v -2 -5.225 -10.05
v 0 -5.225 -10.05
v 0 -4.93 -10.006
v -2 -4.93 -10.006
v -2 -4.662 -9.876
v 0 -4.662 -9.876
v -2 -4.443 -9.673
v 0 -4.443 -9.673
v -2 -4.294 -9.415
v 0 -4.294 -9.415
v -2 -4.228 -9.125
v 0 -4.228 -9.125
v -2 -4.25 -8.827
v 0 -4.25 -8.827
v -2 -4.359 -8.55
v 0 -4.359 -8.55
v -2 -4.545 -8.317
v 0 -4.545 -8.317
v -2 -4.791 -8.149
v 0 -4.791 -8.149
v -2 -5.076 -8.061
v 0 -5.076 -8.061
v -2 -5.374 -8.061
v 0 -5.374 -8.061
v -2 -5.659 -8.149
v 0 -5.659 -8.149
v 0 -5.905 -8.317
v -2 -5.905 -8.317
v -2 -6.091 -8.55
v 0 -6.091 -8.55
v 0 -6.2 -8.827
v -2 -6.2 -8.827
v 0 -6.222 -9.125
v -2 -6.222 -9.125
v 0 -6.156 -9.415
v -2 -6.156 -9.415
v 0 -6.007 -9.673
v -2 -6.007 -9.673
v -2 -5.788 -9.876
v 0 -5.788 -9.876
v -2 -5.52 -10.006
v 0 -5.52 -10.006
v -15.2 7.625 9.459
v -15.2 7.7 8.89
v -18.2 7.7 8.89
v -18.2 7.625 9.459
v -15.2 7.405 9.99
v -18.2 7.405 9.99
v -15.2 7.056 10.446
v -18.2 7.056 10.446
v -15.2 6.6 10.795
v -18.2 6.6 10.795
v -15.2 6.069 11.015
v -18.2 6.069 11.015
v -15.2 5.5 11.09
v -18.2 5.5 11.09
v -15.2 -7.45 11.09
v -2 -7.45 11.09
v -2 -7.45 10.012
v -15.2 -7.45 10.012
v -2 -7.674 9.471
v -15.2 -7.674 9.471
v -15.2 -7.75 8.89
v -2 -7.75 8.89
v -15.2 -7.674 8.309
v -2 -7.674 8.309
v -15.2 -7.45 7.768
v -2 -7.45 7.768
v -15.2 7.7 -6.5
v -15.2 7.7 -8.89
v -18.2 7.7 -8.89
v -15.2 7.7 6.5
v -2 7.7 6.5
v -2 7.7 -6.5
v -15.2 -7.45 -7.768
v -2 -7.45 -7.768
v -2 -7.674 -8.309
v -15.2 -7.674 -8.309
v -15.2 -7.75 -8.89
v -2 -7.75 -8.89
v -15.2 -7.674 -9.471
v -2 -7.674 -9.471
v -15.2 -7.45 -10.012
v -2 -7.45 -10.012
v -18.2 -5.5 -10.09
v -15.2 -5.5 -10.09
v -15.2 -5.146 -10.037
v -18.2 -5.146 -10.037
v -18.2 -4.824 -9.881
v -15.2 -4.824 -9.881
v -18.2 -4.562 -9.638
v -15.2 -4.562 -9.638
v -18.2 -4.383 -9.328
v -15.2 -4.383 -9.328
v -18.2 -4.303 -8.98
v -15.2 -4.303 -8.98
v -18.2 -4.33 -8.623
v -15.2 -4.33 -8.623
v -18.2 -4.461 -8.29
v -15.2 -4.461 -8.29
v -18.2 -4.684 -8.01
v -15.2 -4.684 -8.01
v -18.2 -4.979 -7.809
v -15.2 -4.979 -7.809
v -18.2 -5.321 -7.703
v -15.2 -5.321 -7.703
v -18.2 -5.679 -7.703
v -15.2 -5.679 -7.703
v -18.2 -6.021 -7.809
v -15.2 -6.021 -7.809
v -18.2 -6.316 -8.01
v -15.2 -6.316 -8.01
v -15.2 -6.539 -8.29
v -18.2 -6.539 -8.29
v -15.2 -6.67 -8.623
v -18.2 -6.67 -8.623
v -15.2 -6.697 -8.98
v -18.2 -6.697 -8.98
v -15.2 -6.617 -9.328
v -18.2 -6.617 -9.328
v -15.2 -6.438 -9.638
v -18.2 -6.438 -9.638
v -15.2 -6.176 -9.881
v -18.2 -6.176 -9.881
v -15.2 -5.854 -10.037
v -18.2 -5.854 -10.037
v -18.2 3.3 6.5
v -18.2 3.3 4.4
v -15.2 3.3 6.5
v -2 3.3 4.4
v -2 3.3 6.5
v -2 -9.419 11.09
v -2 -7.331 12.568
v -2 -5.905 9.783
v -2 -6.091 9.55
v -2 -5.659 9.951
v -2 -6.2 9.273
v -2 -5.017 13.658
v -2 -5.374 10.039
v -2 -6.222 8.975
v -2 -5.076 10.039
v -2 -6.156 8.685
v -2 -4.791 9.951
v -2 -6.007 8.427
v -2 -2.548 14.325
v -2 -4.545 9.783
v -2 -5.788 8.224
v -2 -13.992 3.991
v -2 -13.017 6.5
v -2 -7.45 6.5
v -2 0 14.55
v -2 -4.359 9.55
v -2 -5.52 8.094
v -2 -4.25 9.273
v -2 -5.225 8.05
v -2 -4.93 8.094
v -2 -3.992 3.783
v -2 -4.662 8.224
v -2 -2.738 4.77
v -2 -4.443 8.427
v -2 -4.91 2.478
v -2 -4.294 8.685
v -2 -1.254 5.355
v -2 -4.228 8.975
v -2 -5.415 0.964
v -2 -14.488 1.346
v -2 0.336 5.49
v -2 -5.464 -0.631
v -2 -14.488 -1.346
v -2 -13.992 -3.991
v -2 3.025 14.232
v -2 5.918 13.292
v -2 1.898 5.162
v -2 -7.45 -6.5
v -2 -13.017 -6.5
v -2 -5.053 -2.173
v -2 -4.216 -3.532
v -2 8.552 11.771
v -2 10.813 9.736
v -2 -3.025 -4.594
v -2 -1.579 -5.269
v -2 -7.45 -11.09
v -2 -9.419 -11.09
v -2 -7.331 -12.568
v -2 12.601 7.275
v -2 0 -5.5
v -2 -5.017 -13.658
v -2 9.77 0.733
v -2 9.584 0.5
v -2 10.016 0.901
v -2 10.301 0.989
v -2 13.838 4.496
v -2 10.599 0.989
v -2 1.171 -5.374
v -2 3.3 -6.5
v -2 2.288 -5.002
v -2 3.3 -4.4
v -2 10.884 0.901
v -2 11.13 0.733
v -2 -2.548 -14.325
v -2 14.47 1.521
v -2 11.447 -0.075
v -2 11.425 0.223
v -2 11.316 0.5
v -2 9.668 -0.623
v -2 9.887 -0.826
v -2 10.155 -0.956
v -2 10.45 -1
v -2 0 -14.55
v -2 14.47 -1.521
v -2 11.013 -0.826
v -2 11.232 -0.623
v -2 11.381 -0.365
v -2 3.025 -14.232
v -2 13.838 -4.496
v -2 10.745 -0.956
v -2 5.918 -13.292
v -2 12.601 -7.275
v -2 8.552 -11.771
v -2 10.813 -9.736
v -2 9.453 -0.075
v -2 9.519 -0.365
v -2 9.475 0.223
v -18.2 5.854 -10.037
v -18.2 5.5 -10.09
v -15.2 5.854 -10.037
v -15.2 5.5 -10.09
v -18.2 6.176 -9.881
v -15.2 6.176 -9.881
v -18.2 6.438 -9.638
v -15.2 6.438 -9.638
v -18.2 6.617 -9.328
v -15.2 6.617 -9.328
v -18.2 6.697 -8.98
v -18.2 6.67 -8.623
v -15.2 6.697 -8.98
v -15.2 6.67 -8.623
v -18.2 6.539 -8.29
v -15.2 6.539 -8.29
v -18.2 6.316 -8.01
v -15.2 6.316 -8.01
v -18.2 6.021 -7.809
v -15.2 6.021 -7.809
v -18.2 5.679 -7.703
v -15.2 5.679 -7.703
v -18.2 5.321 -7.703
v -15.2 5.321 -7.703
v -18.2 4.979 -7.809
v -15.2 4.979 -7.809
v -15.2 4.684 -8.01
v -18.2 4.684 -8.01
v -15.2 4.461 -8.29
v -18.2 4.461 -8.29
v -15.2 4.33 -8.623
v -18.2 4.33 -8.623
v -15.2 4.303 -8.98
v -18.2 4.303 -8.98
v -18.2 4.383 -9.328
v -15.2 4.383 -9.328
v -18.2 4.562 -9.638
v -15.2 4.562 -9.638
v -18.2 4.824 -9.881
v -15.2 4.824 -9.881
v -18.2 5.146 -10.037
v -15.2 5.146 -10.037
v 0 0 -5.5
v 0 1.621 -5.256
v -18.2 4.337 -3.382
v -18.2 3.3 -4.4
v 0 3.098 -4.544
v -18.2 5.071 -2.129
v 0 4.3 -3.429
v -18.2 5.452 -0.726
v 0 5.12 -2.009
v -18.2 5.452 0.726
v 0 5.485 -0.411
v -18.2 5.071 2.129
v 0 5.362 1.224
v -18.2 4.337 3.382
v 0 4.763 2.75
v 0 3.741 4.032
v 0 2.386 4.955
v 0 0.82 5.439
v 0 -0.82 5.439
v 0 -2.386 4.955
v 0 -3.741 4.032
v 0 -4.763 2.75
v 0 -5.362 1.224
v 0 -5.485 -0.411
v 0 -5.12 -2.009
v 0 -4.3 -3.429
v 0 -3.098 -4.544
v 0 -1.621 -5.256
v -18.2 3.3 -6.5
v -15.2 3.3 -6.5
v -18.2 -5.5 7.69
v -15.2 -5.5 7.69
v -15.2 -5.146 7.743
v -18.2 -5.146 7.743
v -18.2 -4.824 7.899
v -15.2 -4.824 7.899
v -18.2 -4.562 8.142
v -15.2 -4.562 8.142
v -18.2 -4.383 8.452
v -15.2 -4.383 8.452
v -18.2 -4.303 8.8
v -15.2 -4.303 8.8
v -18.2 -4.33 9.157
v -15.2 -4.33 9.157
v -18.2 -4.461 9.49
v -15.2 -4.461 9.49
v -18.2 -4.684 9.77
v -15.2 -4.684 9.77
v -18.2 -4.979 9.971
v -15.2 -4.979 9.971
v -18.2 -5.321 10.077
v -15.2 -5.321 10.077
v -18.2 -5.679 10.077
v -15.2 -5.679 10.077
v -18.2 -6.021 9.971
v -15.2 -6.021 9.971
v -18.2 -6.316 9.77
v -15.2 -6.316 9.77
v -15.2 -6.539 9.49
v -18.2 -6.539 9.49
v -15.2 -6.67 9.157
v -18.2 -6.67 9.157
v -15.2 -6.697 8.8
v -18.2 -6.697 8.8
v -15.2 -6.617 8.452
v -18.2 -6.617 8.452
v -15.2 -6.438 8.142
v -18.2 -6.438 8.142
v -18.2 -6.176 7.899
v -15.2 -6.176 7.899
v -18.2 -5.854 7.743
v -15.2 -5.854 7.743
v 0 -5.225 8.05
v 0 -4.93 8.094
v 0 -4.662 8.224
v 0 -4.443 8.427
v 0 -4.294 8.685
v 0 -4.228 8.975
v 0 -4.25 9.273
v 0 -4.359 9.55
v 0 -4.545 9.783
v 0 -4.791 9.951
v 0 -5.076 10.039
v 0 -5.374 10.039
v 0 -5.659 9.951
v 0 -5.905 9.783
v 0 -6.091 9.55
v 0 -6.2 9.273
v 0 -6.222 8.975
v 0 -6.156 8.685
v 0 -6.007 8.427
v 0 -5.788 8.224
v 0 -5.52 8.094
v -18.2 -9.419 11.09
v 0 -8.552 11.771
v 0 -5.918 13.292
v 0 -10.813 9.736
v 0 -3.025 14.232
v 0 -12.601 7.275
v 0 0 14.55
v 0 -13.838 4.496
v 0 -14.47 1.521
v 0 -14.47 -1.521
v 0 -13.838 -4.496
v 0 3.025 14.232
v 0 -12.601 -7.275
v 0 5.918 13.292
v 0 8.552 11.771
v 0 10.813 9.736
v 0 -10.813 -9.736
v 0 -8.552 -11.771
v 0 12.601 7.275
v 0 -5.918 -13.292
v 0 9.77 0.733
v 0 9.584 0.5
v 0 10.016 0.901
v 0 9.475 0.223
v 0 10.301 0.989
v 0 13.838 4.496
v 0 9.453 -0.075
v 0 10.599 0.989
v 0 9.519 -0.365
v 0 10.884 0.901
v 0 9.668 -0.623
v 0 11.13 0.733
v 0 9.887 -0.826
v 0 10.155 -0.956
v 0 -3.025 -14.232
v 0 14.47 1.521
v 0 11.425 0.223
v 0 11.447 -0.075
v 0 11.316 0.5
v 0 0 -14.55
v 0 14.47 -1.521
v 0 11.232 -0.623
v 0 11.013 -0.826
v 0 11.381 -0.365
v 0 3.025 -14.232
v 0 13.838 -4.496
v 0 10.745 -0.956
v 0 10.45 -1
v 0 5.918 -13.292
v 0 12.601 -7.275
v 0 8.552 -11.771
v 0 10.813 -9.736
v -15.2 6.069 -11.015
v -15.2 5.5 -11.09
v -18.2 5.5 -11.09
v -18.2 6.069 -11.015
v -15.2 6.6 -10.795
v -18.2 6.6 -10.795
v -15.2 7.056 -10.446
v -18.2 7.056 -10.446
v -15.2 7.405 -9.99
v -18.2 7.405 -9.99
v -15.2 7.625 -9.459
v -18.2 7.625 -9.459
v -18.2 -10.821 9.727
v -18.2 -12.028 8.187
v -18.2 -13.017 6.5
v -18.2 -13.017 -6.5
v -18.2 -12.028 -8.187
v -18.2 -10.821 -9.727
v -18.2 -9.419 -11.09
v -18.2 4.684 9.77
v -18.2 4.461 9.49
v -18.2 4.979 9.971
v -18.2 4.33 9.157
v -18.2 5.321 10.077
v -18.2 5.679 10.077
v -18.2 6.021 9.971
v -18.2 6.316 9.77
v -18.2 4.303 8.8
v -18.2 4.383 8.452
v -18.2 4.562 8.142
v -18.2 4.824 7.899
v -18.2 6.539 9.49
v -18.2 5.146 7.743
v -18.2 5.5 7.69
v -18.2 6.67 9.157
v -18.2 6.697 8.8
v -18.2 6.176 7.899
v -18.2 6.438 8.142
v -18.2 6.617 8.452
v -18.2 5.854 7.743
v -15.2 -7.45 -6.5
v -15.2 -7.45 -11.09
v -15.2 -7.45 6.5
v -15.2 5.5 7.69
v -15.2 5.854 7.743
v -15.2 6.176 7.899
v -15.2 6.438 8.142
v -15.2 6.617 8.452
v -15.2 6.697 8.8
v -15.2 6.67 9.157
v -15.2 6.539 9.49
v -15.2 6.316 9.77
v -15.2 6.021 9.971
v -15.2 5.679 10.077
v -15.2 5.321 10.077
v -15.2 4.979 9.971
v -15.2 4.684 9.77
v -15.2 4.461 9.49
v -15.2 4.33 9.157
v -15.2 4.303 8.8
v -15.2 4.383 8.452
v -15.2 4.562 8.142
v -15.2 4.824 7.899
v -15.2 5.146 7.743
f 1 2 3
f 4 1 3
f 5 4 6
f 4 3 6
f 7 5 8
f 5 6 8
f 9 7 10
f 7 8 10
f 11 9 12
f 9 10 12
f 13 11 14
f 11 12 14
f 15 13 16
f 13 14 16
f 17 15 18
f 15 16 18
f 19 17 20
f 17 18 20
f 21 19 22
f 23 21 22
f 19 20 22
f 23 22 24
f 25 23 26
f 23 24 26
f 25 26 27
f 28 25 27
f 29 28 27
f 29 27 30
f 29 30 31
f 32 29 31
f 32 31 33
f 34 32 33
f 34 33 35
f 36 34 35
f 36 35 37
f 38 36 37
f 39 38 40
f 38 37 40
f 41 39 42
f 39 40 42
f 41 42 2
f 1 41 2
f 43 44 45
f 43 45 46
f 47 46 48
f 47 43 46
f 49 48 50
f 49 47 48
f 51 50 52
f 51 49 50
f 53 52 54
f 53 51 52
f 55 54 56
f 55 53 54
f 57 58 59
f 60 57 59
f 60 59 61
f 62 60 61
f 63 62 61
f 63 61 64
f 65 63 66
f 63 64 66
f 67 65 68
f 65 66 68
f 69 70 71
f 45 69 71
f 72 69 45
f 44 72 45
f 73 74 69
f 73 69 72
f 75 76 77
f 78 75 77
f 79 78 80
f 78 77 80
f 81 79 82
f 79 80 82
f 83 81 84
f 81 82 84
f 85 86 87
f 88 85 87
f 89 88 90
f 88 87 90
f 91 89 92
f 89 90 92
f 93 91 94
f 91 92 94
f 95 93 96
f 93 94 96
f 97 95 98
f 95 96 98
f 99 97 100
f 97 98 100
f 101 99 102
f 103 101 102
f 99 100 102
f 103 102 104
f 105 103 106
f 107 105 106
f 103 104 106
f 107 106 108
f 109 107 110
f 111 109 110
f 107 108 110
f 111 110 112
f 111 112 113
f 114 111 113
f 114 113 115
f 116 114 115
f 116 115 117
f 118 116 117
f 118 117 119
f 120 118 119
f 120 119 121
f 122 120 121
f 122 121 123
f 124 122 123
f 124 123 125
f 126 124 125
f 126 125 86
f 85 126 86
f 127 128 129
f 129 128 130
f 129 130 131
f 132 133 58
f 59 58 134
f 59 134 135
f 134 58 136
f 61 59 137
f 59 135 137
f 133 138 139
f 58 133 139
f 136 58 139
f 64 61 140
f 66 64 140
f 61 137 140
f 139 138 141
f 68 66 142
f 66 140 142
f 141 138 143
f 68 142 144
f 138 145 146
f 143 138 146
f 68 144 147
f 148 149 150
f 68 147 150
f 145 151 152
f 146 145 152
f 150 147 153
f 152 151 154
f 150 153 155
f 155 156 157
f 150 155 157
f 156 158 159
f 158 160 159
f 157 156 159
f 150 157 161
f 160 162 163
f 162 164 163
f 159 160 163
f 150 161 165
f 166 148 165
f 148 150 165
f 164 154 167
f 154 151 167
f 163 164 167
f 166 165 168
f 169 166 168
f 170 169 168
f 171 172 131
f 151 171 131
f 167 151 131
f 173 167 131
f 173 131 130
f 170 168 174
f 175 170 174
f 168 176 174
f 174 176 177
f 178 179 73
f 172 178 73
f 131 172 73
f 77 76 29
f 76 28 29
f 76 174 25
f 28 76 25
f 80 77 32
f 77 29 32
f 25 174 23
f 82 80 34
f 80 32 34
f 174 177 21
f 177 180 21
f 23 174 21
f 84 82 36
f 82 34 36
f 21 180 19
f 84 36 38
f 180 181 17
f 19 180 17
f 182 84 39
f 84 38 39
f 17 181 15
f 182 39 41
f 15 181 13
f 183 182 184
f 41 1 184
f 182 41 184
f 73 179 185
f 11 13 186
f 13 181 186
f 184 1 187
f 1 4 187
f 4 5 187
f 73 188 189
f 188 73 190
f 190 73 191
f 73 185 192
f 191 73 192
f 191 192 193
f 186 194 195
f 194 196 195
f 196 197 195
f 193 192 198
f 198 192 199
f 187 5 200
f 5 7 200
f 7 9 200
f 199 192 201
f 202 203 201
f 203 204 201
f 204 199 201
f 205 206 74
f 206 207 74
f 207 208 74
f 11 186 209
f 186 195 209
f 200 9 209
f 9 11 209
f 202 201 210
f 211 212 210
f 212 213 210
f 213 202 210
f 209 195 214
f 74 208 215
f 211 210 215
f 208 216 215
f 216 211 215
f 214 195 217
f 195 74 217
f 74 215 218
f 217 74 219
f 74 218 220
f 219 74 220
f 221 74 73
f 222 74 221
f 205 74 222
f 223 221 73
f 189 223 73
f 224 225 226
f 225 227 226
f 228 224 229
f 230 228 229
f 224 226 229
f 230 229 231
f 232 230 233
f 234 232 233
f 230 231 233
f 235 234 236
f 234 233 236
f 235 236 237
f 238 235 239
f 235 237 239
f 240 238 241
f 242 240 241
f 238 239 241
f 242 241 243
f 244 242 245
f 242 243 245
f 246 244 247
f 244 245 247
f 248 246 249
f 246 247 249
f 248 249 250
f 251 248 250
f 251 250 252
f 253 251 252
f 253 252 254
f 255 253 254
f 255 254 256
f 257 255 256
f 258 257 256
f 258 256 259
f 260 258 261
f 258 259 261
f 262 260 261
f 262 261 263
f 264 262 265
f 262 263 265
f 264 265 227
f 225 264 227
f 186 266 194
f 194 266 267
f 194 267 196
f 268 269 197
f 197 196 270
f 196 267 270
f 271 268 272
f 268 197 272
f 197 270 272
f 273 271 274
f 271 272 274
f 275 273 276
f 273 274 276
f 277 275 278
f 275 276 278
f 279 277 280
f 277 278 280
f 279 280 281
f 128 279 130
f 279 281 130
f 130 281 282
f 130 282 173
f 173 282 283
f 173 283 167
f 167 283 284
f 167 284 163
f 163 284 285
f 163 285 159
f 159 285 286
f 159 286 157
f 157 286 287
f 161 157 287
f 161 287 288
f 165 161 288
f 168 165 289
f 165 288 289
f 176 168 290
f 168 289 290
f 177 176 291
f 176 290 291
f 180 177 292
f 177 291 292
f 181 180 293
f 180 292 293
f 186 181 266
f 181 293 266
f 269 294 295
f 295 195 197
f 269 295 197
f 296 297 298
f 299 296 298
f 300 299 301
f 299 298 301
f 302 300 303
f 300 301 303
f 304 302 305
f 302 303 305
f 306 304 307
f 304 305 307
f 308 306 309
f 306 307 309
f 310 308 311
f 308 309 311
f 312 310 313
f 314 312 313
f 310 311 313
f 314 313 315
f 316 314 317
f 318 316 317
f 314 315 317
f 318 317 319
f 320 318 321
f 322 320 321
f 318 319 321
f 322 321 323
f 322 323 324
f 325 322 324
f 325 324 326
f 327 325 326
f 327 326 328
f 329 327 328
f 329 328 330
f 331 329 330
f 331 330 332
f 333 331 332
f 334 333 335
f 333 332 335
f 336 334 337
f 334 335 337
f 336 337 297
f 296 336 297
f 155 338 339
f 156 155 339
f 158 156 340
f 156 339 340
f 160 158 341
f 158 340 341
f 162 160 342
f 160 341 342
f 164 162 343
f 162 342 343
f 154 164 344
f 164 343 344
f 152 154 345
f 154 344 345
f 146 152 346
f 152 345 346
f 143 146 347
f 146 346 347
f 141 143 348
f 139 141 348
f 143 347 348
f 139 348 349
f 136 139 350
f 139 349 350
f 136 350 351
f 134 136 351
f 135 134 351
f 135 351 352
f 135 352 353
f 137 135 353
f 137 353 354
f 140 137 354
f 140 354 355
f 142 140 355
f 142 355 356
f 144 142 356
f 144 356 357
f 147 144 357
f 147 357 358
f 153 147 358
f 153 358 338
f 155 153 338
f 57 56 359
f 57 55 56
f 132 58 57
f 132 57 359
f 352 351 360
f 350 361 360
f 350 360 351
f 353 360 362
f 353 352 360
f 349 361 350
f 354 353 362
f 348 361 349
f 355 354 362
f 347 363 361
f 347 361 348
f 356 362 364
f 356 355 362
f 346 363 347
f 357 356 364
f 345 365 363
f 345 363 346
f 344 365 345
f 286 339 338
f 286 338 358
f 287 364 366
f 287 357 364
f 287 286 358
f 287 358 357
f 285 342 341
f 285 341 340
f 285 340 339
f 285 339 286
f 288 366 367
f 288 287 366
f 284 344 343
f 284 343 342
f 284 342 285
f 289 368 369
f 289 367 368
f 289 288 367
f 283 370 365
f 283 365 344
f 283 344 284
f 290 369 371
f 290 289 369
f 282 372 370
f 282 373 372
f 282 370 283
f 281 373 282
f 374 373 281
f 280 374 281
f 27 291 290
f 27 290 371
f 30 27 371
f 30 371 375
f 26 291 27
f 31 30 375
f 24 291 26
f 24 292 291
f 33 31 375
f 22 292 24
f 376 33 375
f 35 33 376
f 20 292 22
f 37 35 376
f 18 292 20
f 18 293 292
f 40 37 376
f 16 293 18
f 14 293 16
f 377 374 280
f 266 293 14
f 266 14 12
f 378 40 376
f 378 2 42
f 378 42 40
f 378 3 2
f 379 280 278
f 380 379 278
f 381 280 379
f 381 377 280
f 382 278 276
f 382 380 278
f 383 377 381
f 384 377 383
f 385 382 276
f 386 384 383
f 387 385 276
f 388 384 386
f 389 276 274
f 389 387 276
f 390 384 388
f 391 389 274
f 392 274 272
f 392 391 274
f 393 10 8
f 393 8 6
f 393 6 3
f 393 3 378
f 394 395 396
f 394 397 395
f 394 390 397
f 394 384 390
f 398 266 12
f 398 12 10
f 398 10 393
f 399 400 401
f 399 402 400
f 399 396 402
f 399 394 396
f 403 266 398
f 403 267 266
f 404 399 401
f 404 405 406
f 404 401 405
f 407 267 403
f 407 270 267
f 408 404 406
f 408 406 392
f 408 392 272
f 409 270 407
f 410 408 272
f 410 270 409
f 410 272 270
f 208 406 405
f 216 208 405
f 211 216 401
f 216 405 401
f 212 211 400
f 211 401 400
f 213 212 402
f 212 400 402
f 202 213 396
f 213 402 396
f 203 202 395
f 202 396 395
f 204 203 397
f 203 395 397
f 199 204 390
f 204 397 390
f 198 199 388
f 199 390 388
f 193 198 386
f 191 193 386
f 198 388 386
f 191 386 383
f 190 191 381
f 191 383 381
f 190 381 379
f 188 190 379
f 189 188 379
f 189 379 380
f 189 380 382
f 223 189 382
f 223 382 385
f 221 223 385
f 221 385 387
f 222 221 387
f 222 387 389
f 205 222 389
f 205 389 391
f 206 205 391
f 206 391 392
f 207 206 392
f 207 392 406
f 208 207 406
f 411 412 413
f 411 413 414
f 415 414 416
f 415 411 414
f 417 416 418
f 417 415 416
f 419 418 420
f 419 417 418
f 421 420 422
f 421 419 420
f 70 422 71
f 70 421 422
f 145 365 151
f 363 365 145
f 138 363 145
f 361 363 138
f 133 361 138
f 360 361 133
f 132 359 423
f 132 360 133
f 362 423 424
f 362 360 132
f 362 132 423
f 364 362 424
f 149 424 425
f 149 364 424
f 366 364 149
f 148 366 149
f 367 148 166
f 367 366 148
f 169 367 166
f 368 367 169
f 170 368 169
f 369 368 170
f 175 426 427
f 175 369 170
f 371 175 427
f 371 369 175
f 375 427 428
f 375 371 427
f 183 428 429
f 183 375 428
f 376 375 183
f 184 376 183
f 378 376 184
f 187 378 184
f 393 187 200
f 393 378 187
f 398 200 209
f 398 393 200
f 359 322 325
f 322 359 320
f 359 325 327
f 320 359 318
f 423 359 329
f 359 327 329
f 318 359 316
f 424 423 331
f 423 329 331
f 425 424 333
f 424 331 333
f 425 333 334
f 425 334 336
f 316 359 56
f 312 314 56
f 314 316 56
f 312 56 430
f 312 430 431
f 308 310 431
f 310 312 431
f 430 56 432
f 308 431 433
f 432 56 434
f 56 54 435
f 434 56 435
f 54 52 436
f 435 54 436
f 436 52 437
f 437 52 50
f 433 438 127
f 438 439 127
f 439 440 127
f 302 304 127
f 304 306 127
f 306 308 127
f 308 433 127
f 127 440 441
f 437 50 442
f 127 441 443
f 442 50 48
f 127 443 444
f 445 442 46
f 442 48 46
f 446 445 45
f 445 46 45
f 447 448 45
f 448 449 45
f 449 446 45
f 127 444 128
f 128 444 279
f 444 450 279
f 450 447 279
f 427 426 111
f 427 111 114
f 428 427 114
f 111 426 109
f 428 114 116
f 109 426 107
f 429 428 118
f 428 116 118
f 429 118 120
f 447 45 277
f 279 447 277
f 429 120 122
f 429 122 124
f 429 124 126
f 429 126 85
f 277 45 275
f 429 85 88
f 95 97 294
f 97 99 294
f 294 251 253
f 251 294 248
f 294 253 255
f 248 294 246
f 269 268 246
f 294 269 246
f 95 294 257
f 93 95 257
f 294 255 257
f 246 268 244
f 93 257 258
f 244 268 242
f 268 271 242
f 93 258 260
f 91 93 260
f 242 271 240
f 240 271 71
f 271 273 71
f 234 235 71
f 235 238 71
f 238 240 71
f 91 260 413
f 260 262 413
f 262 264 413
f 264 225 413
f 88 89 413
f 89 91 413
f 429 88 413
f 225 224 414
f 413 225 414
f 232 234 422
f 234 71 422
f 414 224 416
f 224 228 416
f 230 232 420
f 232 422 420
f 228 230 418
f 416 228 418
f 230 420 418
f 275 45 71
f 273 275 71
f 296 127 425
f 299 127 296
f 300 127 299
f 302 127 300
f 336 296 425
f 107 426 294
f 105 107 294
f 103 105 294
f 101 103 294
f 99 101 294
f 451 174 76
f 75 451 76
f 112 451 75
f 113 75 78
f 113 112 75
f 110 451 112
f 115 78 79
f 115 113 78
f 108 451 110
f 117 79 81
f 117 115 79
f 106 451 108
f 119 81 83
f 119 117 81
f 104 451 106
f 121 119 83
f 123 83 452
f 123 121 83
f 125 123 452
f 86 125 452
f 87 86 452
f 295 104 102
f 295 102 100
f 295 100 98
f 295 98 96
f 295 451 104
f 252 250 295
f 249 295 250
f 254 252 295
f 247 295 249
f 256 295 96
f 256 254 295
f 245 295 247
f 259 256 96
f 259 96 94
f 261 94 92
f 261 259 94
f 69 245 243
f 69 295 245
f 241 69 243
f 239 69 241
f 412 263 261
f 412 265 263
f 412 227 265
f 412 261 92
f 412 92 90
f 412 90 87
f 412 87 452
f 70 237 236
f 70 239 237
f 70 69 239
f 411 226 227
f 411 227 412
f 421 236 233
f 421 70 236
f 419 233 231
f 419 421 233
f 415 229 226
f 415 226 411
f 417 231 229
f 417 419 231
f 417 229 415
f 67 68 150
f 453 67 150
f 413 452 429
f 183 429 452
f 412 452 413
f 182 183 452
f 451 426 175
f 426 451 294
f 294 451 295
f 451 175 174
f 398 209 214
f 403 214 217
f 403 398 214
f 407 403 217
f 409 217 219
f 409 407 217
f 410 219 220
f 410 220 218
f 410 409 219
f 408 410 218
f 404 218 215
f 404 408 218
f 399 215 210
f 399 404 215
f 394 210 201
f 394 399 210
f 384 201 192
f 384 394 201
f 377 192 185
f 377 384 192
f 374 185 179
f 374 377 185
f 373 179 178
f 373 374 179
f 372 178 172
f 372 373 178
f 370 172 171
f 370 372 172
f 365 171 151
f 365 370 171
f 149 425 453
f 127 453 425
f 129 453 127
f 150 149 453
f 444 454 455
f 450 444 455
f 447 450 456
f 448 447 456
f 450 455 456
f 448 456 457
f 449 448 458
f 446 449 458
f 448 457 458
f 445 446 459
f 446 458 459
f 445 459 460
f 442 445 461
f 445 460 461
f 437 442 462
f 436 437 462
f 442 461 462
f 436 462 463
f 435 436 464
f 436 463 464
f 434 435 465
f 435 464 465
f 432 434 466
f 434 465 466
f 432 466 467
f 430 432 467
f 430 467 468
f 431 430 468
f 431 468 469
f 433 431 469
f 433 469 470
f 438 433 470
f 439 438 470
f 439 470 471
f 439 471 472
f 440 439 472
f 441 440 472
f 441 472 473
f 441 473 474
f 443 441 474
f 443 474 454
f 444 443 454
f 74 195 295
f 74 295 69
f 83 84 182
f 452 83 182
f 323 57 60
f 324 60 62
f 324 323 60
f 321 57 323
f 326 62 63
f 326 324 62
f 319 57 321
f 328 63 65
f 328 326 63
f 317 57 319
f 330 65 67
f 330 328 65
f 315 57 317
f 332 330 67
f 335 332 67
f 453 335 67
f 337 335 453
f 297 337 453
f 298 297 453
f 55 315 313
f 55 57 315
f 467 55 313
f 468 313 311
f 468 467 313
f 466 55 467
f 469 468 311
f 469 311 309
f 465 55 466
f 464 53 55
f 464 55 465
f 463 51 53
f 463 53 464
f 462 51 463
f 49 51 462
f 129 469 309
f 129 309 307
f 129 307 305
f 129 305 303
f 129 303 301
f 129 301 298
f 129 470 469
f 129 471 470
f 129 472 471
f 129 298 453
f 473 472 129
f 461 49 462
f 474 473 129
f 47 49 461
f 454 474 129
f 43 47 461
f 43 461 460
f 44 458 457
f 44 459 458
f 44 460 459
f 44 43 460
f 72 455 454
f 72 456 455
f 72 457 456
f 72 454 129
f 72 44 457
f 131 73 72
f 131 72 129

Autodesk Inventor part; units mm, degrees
ref_plane "YZ Plane" through (0, 0, 0) normal (1, 0, 0) x (0, 1, 0)
ref_plane "XZ Plane" through (0, 0, 0) normal (0, 1, 0) x (-1, 0, 0)
ref_plane "Arbeitsebene1" through (0, 0, 0) normal (1, 0, 0) x (0, 0, -1)
sketch "Skizze1" plane through (0, 0, 0) normal (1, 0, 0) x (0, 0, -1)
  arc A0 (14.55, 0) -> (-14.55, 0) centre (0, 0) ccw
  circle A1 centre (0, 0) radius 5.5
  line L0 (-20.8128, 0) -> (22.3238, 0) construction
  line L1 (0, -22.3037) -> (0, 20.6923) construction
  circle A2 centre (0, 10.45) radius 1
  circle A3 centre (-9.05, -5.225) radius 1
  circle A4 centre (9.05, -5.225) radius 1
  circle A5 centre (0, 0) radius 10.45 construction
  line L2 (0, 0) -> (9.05, -5.225) construction
  line L3 (0, 0) -> (-9.05, -5.225) construction
  line L4 (8.89, -5.5) -> (-8.89, -5.5) construction
  line L5 (-8.89, -5.5) -> (-8.89, 5.5) construction
  line L6 (-8.89, 5.5) -> (8.89, 5.5) construction
  line L7 (8.89, 5.5) -> (8.89, -5.5) construction
  circle A6 centre (8.89, 5.5) radius 1.2
  circle A7 centre (-8.89, 5.5) radius 1.2
  arc A8 (-14.55, 0) -> (14.1469, 3.4013) centre (0, 0) ccw
  line L8 (8.89, 7.7) -> (-8.89, 7.7)
  line L9 (6.5, 3.3) -> (6.5, 7.7)
  line L10 (-4.3414, 8.5633) -> (-4.3414, 8.4781)
  line L11 (-6.5, 7.7) -> (-6.5, 3.3)
  arc A9 (4.4, 3.3) -> (-4.4, 3.3) centre (0, 0) ccw
  line L12 (6.5, 3.3) -> (4.4, 3.3)
  line L13 (-4.4, 3.3) -> (-6.5, 3.3)
  line L14 (-6.5, -13.0174) -> (-6.5, -7.45)
  line L15 (6.5, -13.0174) -> (6.5, -7.45)
  line L16 (11.09, -9.4188) -> (11.09, -7.45)
  circle A10 centre (8.89, -5.5) radius 1.2
  circle A11 centre (-8.89, -5.5) radius 1.2
  line L17 (11.09, -7.45) -> (11.09, 5.5)
  line L18 (-6.5, -7.45) -> (-6.5, 3.3)
  line L19 (-11.09, -7.45) -> (-11.09, 5.5)
  arc A12 (-8.89, 7.7) -> (-11.09, 5.5) centre (-8.89, 5.5) ccw
  arc A13 (11.09, 5.5) -> (8.89, 7.7) centre (8.89, 5.5) ccw
  arc A14 (7.7675, -7.45) -> (10.0125, -7.45) centre (8.89, -5.5) ccw
  line L20 (6.5, -7.45) -> (7.7675, -7.45)
  line L21 (10.0125, -7.45) -> (11.09, -7.45)
  arc A15 (-10.0125, -7.45) -> (-7.7675, -7.45) centre (-8.89, -5.5) ccw
  line L22 (-11.09, -7.45) -> (-10.0125, -7.45)
  line L23 (-7.7675, -7.45) -> (-6.5, -7.45)
  line L24 (6.5, -7.45) -> (6.5, 3.3)
  line L25 (-11.09, -7.45) -> (-11.09, -9.4188)
  point P0 (0, 14.55)
  dimension "d2" = 11
  dimension "d9" = 2
  dimension "d11" = 120
  dimension "d12" = 20.9
  dimension "d19" = 11
  dimension "d20" = 17.78
  dimension "d22" = 2.4
  dimension "d29" = 14.55
  dimension "d30" = 5.5
  dimension "d38" = 2.2
  dimension "d39" = 13
  dimension "d42" = 4.5
  dimension "d43" = 0.3
extrude "Extrusion1" add sketch "Skizze1" against normal blind 2 contours A8 L16 L17 A13 L8 A12 L19 L25 A0 | A8 L15 L20 A14 L21 L16 | A8 L14 L18 L13 A1 L12 L24 L15 | L21 A14 L20 L24 L9 L8 A13 L17 | L25 L22 A15 L23 L14 A8 | L19 A12 L8 L11 L18 L23 A15 L22 | L12 A1 L13 L11 L8 L9 | A3 A11 | A4 A10 | A6 | A7 picked at (-8.3922, -6.3901) picked at (8.4037, -6.3962)
extrude "Extrusion3" add sketch "Skizze1" against normal blind 13.2 from surface at -2 contours A8 L15 L20 A14 L21 L16 | L25 L22 A15 L23 L14 A8 | L12 A1 L13 L11 L8 L9
extrude "Extrusion4" add sketch "Skizze1" against normal blind 3 from surface at -15.2 contours A8 L15 L20 A14 L21 L16 | L21 A14 L20 L24 L9 L8 A13 L17 | L25 L22 A15 L23 L14 A8 | L19 A12 L8 L11 L18 L23 A15 L22 | L12 A1 L13 L11 L8 L9 | A11 A3 | A10 A4 picked at (-9.542, -4.4536) picked at (9.542, -4.4536)
properties part number "AS5047DEnclosure"
